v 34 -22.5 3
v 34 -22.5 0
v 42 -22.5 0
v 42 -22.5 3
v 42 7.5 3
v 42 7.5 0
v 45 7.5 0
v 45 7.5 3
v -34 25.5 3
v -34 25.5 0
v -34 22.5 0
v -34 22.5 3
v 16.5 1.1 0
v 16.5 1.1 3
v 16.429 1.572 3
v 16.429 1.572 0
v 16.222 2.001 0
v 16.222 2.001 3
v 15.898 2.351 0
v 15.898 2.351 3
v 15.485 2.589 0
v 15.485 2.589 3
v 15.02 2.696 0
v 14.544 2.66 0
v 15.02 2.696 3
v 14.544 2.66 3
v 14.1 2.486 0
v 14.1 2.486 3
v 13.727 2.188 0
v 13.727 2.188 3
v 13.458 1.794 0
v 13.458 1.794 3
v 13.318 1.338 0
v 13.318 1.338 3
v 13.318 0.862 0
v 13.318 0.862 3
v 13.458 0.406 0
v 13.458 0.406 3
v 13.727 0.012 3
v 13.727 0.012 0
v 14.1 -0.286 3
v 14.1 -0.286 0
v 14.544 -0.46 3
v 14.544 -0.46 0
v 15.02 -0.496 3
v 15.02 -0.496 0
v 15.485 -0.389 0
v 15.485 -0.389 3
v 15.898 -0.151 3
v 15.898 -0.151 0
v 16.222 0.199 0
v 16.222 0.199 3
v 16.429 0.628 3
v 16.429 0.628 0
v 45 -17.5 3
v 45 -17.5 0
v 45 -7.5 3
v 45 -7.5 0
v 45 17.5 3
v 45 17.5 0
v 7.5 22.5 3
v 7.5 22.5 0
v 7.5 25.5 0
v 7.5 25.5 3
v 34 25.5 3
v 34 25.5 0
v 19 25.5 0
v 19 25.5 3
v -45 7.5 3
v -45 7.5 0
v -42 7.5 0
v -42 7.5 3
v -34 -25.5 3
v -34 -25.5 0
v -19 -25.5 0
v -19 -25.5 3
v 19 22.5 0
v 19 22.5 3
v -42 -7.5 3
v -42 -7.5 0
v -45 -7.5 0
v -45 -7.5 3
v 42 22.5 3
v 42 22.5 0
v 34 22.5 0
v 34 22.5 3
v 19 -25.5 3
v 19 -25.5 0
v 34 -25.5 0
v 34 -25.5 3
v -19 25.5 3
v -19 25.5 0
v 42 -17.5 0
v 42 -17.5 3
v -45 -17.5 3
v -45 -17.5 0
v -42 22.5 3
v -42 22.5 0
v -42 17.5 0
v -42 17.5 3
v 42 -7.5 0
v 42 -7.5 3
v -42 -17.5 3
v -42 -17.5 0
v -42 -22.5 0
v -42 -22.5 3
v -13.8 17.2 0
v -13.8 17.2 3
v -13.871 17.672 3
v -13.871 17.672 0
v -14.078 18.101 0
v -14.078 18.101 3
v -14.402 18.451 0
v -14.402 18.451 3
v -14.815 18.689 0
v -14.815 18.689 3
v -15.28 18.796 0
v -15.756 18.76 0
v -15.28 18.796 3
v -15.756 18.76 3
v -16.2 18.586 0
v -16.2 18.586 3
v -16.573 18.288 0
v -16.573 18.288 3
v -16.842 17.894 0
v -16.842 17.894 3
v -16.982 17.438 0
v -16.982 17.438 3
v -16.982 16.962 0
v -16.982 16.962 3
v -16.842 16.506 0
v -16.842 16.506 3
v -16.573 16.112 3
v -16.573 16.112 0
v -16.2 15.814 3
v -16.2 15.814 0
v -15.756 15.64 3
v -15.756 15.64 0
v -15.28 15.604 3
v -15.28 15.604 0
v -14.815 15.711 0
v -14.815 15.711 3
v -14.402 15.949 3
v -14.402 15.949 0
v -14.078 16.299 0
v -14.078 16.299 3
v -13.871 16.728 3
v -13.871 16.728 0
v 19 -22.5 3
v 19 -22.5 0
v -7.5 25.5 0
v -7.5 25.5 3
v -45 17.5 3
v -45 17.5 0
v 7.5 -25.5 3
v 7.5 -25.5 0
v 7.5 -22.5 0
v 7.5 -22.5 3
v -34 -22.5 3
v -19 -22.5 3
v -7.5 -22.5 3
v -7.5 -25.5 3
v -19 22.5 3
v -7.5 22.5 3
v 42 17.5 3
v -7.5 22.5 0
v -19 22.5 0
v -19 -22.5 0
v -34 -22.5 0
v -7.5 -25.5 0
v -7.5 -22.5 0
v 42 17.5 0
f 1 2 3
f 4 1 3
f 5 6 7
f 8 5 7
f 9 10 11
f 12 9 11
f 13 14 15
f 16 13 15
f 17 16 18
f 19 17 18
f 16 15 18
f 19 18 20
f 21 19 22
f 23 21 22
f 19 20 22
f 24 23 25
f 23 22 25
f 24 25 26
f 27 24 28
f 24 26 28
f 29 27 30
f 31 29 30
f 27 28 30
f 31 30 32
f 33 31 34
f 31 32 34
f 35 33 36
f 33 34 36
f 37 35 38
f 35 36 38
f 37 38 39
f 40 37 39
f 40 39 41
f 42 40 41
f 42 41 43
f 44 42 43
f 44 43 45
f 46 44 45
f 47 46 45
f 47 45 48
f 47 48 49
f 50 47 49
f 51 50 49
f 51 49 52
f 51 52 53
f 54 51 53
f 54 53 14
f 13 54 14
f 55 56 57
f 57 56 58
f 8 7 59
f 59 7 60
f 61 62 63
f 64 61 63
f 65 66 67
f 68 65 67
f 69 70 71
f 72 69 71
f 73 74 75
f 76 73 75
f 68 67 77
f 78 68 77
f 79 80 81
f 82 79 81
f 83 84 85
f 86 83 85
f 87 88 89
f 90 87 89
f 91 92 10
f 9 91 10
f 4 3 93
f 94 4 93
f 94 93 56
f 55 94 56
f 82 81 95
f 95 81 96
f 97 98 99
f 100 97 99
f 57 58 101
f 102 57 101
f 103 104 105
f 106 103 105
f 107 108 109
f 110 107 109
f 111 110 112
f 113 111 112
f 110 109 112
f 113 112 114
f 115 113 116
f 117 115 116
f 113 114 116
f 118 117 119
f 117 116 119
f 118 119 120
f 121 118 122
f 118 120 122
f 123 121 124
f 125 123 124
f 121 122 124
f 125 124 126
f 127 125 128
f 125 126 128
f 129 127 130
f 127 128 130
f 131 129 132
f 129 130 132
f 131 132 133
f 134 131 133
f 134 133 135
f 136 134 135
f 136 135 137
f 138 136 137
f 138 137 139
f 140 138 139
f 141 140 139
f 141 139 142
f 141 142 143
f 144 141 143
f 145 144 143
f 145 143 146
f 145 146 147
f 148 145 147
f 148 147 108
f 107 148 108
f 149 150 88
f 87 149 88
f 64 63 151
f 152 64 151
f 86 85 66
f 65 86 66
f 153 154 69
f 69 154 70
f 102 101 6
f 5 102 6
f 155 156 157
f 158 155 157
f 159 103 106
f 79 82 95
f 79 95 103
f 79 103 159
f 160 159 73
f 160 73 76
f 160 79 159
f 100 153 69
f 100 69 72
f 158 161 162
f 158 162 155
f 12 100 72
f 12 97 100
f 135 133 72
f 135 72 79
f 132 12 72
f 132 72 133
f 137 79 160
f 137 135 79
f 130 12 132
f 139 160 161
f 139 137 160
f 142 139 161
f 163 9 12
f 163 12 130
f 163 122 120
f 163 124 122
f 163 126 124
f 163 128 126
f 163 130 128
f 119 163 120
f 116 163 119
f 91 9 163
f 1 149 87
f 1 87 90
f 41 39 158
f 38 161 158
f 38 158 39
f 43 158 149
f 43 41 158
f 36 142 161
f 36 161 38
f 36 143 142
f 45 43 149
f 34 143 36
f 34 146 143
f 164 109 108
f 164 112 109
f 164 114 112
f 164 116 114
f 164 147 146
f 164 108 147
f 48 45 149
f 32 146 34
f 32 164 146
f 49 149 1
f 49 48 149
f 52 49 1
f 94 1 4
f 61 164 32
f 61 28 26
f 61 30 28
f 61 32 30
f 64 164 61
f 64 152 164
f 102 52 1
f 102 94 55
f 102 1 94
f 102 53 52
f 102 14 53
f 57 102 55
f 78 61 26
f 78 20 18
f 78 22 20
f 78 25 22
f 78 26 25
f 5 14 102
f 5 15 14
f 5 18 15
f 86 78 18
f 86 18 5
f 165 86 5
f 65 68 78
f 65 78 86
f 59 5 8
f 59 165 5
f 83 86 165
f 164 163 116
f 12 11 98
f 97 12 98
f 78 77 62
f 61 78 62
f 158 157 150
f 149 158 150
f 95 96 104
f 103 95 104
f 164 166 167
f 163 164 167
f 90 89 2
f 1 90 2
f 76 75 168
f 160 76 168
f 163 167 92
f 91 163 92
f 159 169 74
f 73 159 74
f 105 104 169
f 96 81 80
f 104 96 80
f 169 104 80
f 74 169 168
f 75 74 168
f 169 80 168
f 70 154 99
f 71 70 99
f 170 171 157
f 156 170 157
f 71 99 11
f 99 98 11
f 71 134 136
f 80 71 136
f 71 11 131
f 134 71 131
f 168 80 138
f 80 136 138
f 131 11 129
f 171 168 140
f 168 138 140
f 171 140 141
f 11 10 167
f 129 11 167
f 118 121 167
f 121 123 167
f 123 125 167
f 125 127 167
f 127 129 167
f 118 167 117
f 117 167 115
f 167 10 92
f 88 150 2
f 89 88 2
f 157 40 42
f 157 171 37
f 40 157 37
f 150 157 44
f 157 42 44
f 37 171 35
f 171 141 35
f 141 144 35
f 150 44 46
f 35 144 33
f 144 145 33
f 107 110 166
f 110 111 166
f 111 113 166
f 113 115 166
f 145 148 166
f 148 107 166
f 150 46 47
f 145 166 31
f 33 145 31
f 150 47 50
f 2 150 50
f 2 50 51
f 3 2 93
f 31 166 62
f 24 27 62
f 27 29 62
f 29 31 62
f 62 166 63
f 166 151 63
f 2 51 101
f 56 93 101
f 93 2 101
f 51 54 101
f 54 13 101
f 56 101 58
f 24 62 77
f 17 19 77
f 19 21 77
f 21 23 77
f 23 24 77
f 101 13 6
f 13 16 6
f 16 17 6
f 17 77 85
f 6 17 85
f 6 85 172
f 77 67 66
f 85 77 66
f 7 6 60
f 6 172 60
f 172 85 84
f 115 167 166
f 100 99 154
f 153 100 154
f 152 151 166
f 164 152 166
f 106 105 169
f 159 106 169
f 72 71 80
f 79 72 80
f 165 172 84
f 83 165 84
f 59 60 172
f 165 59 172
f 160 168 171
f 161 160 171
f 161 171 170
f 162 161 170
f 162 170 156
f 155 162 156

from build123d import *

# Parameters (mm, degrees)
EXTRUDE_1_DEPTH     = 3
SKETCH_3_R          = 1.6
CUT_EXTRUDE_1_DEPTH = 52.809748118


with BuildPart() as part:
    # 草图1 → 凸台-拉伸1 (new body)
    with BuildSketch(Plane.XY):
        Polygon((-42, -22.5), (-34, -22.5), (-34, -25.5), (-19, -25.5), (-19, -22.5), (-7.5, -22.5), (-7.5, -25.5), (7.5, -25.5), (7.5, -22.5), (19, -22.5), (19, -25.5), (34, -25.5), (34, -22.5), (42, -22.5), (42, -17.5), (45, -17.5), (45, -7.5), (42, -7.5), (42, 7.5), (45, 7.5), (45, 17.5), (42, 17.5), (42, 22.5), (34, 22.5), (34, 25.5), (19, 25.5), (19, 22.5), (7.5, 22.5), (7.5, 25.5), (-7.5, 25.5), (-7.5, 22.5), (-19, 22.5), (-19, 25.5), (-34, 25.5), (-34, 22.5), (-42, 22.5), (-42, 17.5), (-45, 17.5), (-45, 7.5), (-42, 7.5), (-42, -7.5), (-45, -7.5), (-45, -17.5), (-42, -17.5), align=None)
    extrude(amount=EXTRUDE_1_DEPTH)

    # 草图3 → 切除-拉伸1 (cut, through all)
    with BuildSketch(Plane.XY.offset(3)):
        with Locations((-15.4, 17.2)):
            Circle(SKETCH_3_R)
        with Locations((14.9, 1.1)):
            Circle(SKETCH_3_R)
    extrude(amount=-CUT_EXTRUDE_1_DEPTH, mode=Mode.SUBTRACT)


solid = part.part
